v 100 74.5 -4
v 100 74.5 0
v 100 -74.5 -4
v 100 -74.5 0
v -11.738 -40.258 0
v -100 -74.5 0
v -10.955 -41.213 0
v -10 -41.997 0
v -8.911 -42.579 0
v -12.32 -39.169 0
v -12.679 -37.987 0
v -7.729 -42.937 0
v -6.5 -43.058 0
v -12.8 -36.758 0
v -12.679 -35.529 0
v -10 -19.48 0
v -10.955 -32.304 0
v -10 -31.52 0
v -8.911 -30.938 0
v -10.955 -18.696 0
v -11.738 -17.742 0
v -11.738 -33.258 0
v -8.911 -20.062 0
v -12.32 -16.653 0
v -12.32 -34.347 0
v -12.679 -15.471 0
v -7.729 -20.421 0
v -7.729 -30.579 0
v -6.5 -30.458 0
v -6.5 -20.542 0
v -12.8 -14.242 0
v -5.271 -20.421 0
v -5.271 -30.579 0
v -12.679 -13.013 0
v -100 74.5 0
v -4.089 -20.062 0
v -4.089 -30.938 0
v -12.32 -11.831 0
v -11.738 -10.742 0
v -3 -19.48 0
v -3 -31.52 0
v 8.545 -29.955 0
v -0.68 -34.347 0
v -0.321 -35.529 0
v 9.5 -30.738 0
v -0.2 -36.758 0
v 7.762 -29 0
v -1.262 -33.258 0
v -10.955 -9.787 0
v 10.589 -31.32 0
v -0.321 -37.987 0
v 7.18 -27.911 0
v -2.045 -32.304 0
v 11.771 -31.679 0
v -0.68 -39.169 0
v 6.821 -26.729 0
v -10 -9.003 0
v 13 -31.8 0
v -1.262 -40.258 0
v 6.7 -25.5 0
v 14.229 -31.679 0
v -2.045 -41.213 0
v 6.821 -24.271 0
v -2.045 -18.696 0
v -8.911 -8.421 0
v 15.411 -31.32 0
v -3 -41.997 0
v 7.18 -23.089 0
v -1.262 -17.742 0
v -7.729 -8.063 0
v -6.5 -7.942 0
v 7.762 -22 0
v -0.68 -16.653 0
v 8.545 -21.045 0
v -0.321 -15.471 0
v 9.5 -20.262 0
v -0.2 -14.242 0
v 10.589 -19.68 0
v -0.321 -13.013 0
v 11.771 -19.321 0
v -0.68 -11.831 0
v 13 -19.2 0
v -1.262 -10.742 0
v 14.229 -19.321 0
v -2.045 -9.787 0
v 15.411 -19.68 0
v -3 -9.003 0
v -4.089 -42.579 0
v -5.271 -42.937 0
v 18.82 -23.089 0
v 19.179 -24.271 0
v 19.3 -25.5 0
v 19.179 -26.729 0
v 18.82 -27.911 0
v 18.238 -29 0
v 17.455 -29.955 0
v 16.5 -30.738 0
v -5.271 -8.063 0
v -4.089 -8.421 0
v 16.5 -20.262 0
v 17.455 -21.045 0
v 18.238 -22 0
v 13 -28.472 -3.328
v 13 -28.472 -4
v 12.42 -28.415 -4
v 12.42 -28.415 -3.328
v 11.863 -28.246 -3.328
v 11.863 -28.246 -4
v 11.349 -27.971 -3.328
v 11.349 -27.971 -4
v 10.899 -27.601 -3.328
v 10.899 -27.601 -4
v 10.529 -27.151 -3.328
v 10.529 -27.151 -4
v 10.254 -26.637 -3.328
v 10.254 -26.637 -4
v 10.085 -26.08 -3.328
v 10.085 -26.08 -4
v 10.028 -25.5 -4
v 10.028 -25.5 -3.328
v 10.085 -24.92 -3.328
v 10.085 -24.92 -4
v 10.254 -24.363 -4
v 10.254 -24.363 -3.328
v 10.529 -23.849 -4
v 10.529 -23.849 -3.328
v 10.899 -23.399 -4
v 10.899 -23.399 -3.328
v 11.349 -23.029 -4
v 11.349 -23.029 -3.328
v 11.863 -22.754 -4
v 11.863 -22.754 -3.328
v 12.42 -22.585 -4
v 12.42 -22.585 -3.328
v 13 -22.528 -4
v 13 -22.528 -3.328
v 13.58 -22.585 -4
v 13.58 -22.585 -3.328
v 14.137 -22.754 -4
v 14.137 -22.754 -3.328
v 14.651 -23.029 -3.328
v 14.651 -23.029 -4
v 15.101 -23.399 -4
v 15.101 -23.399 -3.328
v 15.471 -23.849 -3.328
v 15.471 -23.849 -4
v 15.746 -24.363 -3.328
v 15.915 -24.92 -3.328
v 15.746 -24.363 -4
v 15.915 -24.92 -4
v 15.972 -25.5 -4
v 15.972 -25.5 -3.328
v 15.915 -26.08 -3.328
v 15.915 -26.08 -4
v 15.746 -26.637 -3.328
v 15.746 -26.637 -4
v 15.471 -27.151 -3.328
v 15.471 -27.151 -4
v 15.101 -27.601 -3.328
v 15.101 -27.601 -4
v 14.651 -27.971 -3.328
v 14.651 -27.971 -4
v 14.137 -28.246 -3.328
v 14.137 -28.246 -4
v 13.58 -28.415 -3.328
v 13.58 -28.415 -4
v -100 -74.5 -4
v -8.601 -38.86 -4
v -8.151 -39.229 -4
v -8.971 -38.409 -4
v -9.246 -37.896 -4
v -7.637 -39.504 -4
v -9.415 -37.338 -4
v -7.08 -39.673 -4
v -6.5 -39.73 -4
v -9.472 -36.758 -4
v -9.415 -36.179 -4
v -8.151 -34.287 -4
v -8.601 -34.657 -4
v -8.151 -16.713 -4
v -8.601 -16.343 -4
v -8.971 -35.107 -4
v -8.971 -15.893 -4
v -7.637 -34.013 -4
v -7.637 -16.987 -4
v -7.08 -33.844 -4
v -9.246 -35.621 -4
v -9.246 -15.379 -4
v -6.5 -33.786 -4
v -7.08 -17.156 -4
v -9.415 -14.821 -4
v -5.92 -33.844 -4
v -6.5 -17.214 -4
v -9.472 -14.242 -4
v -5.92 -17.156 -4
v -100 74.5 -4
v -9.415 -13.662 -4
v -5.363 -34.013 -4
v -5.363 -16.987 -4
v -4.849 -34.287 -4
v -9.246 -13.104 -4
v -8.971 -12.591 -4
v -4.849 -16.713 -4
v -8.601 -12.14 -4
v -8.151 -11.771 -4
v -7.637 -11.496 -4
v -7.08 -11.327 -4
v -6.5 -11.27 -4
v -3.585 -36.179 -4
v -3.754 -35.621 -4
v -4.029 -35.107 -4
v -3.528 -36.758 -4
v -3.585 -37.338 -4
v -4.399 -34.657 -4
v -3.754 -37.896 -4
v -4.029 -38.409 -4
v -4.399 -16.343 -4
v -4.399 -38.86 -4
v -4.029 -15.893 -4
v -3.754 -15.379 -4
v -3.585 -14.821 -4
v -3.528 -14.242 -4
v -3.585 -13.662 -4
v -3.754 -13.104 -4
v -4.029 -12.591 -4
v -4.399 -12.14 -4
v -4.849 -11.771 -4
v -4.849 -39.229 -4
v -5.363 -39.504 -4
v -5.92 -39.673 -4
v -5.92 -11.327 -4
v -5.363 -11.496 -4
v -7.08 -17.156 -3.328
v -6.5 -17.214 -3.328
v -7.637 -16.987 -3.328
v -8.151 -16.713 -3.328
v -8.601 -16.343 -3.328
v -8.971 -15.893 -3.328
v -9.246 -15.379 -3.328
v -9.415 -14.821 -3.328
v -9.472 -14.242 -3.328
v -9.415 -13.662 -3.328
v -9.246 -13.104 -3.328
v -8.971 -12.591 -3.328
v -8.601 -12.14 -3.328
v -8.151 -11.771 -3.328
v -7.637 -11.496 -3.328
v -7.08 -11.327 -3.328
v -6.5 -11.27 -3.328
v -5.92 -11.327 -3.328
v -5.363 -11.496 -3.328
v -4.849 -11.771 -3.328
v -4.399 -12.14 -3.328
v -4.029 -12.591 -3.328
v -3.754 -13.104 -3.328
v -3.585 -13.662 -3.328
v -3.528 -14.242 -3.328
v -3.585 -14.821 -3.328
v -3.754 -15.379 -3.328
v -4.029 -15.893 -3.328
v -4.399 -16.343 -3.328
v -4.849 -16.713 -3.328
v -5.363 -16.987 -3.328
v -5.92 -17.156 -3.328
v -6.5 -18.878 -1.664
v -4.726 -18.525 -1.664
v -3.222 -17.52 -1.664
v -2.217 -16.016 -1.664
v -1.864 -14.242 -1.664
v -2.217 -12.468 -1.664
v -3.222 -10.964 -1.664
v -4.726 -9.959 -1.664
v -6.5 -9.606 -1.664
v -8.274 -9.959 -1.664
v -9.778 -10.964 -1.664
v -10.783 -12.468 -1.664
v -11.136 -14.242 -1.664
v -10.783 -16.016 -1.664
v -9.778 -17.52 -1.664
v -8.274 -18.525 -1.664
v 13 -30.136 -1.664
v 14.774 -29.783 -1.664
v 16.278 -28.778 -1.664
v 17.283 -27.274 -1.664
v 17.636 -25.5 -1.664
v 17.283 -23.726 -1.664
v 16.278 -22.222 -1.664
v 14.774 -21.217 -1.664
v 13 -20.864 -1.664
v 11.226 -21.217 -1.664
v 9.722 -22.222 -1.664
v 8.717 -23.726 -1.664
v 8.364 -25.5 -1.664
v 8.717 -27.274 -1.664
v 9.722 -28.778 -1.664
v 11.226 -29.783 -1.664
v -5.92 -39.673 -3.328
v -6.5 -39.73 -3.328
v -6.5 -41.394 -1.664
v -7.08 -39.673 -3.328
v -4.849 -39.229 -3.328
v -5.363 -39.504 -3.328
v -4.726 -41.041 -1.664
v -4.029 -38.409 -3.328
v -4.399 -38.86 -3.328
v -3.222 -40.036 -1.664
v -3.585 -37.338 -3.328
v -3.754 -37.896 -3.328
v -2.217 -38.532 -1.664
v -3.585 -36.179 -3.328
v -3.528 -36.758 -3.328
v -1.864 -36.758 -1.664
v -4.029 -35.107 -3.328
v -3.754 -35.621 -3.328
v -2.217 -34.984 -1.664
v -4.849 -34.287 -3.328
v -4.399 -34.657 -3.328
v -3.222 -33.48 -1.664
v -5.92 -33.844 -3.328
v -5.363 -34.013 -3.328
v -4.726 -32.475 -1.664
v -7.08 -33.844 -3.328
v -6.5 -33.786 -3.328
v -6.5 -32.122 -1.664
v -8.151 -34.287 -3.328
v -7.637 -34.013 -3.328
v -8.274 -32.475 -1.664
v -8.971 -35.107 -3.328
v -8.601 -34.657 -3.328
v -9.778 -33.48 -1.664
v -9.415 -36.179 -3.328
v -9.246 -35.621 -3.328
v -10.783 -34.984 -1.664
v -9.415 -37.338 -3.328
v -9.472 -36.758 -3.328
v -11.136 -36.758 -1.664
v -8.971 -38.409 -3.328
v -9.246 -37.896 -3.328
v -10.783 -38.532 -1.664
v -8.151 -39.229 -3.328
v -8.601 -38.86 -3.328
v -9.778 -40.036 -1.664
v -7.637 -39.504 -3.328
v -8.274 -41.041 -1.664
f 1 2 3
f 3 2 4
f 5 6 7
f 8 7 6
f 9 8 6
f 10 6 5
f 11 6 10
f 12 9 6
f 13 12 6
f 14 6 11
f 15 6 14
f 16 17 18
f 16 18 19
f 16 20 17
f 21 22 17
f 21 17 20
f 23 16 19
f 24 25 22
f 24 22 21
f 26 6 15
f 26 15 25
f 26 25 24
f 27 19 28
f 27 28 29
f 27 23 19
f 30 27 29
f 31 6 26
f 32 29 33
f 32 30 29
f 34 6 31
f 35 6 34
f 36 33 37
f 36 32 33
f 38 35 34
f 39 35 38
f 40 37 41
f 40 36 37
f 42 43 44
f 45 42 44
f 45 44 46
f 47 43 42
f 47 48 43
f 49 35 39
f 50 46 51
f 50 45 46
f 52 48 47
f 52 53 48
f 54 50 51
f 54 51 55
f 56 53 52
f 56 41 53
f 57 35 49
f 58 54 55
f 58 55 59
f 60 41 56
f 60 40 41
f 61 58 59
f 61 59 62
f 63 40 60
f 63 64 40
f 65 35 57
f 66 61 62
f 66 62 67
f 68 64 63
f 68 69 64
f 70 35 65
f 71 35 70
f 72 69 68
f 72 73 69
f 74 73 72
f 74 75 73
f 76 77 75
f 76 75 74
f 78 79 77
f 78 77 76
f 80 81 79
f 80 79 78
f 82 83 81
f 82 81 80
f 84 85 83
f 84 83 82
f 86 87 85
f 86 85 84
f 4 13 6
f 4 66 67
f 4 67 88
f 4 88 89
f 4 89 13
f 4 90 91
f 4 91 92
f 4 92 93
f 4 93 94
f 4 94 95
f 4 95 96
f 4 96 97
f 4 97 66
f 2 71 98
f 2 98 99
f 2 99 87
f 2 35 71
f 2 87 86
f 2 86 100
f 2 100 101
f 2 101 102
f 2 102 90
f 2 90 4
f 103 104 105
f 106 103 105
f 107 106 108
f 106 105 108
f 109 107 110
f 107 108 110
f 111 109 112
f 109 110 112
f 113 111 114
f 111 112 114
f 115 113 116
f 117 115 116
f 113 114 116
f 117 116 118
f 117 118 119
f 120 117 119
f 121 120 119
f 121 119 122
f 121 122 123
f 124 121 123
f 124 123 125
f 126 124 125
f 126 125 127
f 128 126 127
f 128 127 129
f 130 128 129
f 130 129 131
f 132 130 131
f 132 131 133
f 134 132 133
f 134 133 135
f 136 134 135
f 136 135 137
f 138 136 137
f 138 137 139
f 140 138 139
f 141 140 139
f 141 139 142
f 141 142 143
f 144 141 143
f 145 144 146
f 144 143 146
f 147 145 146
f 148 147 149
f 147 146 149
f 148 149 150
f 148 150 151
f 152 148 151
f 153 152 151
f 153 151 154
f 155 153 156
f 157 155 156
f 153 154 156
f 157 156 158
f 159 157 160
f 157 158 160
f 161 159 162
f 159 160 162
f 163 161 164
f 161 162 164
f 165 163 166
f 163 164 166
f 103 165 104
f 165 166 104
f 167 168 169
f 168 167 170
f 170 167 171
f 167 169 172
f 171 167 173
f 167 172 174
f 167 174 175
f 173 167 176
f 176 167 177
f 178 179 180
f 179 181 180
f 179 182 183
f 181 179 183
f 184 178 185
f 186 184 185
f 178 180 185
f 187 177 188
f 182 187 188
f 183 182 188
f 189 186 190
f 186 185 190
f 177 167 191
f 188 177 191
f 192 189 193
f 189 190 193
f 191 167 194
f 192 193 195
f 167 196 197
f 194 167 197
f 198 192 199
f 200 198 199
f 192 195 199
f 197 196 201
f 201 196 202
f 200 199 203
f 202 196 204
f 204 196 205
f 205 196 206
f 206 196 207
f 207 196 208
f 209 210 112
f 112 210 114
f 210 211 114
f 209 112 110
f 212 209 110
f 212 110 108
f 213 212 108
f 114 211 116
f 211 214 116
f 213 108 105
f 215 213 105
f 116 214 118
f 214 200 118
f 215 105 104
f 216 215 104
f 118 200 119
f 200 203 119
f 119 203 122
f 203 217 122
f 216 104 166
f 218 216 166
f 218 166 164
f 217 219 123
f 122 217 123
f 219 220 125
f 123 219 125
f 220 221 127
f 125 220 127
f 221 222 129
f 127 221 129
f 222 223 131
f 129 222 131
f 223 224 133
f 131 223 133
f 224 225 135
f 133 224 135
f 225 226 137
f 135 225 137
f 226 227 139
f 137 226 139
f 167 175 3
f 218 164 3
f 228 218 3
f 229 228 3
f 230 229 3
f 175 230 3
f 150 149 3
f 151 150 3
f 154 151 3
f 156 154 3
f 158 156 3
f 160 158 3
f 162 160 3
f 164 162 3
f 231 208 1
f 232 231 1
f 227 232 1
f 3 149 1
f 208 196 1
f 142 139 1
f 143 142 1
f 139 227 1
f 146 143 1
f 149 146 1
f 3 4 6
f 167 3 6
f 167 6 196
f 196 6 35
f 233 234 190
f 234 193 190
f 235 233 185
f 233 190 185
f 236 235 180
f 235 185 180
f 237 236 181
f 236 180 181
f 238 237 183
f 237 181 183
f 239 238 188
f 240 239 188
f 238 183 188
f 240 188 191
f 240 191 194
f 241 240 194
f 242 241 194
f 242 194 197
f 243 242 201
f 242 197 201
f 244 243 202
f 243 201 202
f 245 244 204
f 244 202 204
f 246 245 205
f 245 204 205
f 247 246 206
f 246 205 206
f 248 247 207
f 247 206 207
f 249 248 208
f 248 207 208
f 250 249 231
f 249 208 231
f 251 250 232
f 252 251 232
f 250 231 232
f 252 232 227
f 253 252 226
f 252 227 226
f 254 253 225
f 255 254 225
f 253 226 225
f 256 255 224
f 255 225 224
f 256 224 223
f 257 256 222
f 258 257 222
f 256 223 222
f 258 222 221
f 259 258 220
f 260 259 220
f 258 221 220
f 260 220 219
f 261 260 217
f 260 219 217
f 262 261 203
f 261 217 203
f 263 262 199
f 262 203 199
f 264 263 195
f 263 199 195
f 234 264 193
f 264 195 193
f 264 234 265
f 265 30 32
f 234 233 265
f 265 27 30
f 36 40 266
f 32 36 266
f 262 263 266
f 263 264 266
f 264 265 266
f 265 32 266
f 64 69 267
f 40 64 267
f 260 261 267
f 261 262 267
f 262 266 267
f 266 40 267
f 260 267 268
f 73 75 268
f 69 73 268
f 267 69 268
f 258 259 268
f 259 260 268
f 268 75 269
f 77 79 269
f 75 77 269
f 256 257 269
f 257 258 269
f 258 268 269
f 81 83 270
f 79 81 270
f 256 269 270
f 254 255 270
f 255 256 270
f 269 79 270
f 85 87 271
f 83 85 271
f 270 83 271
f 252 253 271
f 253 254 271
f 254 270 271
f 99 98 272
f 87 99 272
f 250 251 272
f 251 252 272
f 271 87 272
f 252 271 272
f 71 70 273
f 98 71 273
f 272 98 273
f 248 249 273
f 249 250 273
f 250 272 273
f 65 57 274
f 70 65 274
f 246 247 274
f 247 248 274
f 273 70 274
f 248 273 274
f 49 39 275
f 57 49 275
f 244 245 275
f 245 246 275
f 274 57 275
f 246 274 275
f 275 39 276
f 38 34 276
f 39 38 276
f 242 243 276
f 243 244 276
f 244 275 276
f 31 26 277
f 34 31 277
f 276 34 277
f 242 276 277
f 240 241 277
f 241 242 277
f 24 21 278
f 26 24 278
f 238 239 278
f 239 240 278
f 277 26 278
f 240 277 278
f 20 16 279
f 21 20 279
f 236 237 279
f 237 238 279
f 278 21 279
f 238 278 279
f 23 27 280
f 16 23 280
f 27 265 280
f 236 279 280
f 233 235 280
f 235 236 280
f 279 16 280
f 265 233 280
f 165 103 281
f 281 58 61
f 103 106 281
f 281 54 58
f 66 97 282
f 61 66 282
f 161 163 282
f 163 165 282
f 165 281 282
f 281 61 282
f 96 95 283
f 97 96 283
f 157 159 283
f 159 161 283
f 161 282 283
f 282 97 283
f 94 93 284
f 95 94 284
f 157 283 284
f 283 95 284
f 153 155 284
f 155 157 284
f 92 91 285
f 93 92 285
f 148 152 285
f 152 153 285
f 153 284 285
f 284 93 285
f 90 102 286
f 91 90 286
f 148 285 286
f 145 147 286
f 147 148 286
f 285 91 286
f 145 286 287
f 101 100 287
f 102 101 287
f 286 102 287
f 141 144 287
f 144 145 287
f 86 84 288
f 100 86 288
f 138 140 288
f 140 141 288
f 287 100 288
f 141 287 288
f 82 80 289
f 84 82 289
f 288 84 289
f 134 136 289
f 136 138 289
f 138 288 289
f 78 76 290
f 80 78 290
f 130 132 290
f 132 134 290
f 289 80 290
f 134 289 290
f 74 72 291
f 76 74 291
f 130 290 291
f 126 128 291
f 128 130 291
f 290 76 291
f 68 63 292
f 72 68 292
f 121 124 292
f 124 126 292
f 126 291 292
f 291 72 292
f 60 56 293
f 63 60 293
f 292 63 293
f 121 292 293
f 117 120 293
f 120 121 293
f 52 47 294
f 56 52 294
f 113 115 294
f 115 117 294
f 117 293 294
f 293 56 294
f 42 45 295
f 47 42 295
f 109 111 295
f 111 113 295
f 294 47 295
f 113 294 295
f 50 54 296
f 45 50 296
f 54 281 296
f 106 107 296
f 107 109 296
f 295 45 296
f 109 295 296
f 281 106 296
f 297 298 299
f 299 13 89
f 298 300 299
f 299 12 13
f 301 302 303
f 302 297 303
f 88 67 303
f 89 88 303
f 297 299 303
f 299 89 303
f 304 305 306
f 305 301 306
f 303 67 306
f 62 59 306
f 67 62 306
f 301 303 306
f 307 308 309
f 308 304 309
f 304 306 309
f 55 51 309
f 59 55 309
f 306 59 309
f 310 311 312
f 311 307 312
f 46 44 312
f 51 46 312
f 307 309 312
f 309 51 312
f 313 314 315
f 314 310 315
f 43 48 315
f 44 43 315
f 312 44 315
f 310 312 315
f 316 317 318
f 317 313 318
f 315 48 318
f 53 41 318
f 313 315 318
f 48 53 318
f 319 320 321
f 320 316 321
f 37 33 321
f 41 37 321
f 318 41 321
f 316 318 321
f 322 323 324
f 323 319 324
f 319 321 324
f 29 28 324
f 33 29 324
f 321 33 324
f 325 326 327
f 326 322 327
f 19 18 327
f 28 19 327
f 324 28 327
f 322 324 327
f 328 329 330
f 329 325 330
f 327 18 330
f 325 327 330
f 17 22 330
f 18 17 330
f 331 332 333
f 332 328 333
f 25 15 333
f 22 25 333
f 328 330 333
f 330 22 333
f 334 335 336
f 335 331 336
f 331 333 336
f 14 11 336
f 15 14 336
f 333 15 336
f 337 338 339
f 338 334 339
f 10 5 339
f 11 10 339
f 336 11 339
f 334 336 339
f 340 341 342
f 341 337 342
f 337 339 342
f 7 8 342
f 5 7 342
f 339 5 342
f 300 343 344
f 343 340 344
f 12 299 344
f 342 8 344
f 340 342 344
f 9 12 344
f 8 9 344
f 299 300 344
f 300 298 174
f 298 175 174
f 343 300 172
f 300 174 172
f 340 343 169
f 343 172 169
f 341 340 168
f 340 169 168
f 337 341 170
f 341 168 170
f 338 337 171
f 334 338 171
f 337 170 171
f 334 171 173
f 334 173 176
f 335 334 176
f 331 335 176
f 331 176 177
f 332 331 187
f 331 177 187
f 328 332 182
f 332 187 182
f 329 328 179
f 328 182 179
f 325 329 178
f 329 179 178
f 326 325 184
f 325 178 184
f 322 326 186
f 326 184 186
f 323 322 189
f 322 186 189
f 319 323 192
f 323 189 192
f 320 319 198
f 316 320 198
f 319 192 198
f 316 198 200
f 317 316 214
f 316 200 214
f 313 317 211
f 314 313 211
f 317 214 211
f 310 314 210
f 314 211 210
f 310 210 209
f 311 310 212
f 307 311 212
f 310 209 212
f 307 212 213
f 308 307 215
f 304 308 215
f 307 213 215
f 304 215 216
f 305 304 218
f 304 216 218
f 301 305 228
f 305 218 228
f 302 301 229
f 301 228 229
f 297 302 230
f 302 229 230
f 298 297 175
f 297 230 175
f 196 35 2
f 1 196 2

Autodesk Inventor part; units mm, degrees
ref_plane "YZ Plane" through (0, 0, 0) normal (1, 0, 0) x (0, 1, 0)
ref_plane "XZ Plane" through (0, 0, 0) normal (0, 1, 0) x (-1, 0, 0)
ref_plane "XY Plane" through (0, 0, 0) normal (0, 0, 1) x (1, 0, 0)
sketch "スケッチ1" plane through (0, 0, 0) normal (0, 0, 1) x (1, 0, 0)
  line L0 (-100, 74.5) -> (100, 74.5)
  line L1 (100, 74.5) -> (100, -74.5)
  line L2 (100, -74.5) -> (-100, -74.5)
  line L3 (-100, -74.5) -> (-100, 74.5)
  line L4 (-100, 74.5) -> (100, -74.5) construction
  line L5 (100, 74.5) -> (-100, -74.5) construction
  circle A0 centre (0, -25.5) radius 13
  point P0 (0, 0)
  point P1 (13, -25.5)
  point P2 (-6.5, -14.2417)
  point P3 (-6.5, -36.7583)
  dimension "d4" = 26
  dimension "d0" = 200
  dimension "d1" = 149
  dimension "d10" = 360
  dimension "d19" = 100
  dimension "d20" = 49
  dimension "d22" = 0
extrude "押し出し1" add sketch "スケッチ1" against normal blind 4 contours L0 L1 L2 L3 | A0
hole "穴1" at (13, -25.5, 0) at (-6.5, -14.2417, 0) at (-6.5, -36.7583, 0) direction (0, 0, -1) diameter 5.9436 depth 10.65 tip angle 118 countersink diameter 12.6 countersink angle 90 thread size "1/16" designation "1/16 - 27 NPT" standard "NPT for PVC Pipe and Fitting"
properties part number "Board" material "アルミニウム 2014-T4"
